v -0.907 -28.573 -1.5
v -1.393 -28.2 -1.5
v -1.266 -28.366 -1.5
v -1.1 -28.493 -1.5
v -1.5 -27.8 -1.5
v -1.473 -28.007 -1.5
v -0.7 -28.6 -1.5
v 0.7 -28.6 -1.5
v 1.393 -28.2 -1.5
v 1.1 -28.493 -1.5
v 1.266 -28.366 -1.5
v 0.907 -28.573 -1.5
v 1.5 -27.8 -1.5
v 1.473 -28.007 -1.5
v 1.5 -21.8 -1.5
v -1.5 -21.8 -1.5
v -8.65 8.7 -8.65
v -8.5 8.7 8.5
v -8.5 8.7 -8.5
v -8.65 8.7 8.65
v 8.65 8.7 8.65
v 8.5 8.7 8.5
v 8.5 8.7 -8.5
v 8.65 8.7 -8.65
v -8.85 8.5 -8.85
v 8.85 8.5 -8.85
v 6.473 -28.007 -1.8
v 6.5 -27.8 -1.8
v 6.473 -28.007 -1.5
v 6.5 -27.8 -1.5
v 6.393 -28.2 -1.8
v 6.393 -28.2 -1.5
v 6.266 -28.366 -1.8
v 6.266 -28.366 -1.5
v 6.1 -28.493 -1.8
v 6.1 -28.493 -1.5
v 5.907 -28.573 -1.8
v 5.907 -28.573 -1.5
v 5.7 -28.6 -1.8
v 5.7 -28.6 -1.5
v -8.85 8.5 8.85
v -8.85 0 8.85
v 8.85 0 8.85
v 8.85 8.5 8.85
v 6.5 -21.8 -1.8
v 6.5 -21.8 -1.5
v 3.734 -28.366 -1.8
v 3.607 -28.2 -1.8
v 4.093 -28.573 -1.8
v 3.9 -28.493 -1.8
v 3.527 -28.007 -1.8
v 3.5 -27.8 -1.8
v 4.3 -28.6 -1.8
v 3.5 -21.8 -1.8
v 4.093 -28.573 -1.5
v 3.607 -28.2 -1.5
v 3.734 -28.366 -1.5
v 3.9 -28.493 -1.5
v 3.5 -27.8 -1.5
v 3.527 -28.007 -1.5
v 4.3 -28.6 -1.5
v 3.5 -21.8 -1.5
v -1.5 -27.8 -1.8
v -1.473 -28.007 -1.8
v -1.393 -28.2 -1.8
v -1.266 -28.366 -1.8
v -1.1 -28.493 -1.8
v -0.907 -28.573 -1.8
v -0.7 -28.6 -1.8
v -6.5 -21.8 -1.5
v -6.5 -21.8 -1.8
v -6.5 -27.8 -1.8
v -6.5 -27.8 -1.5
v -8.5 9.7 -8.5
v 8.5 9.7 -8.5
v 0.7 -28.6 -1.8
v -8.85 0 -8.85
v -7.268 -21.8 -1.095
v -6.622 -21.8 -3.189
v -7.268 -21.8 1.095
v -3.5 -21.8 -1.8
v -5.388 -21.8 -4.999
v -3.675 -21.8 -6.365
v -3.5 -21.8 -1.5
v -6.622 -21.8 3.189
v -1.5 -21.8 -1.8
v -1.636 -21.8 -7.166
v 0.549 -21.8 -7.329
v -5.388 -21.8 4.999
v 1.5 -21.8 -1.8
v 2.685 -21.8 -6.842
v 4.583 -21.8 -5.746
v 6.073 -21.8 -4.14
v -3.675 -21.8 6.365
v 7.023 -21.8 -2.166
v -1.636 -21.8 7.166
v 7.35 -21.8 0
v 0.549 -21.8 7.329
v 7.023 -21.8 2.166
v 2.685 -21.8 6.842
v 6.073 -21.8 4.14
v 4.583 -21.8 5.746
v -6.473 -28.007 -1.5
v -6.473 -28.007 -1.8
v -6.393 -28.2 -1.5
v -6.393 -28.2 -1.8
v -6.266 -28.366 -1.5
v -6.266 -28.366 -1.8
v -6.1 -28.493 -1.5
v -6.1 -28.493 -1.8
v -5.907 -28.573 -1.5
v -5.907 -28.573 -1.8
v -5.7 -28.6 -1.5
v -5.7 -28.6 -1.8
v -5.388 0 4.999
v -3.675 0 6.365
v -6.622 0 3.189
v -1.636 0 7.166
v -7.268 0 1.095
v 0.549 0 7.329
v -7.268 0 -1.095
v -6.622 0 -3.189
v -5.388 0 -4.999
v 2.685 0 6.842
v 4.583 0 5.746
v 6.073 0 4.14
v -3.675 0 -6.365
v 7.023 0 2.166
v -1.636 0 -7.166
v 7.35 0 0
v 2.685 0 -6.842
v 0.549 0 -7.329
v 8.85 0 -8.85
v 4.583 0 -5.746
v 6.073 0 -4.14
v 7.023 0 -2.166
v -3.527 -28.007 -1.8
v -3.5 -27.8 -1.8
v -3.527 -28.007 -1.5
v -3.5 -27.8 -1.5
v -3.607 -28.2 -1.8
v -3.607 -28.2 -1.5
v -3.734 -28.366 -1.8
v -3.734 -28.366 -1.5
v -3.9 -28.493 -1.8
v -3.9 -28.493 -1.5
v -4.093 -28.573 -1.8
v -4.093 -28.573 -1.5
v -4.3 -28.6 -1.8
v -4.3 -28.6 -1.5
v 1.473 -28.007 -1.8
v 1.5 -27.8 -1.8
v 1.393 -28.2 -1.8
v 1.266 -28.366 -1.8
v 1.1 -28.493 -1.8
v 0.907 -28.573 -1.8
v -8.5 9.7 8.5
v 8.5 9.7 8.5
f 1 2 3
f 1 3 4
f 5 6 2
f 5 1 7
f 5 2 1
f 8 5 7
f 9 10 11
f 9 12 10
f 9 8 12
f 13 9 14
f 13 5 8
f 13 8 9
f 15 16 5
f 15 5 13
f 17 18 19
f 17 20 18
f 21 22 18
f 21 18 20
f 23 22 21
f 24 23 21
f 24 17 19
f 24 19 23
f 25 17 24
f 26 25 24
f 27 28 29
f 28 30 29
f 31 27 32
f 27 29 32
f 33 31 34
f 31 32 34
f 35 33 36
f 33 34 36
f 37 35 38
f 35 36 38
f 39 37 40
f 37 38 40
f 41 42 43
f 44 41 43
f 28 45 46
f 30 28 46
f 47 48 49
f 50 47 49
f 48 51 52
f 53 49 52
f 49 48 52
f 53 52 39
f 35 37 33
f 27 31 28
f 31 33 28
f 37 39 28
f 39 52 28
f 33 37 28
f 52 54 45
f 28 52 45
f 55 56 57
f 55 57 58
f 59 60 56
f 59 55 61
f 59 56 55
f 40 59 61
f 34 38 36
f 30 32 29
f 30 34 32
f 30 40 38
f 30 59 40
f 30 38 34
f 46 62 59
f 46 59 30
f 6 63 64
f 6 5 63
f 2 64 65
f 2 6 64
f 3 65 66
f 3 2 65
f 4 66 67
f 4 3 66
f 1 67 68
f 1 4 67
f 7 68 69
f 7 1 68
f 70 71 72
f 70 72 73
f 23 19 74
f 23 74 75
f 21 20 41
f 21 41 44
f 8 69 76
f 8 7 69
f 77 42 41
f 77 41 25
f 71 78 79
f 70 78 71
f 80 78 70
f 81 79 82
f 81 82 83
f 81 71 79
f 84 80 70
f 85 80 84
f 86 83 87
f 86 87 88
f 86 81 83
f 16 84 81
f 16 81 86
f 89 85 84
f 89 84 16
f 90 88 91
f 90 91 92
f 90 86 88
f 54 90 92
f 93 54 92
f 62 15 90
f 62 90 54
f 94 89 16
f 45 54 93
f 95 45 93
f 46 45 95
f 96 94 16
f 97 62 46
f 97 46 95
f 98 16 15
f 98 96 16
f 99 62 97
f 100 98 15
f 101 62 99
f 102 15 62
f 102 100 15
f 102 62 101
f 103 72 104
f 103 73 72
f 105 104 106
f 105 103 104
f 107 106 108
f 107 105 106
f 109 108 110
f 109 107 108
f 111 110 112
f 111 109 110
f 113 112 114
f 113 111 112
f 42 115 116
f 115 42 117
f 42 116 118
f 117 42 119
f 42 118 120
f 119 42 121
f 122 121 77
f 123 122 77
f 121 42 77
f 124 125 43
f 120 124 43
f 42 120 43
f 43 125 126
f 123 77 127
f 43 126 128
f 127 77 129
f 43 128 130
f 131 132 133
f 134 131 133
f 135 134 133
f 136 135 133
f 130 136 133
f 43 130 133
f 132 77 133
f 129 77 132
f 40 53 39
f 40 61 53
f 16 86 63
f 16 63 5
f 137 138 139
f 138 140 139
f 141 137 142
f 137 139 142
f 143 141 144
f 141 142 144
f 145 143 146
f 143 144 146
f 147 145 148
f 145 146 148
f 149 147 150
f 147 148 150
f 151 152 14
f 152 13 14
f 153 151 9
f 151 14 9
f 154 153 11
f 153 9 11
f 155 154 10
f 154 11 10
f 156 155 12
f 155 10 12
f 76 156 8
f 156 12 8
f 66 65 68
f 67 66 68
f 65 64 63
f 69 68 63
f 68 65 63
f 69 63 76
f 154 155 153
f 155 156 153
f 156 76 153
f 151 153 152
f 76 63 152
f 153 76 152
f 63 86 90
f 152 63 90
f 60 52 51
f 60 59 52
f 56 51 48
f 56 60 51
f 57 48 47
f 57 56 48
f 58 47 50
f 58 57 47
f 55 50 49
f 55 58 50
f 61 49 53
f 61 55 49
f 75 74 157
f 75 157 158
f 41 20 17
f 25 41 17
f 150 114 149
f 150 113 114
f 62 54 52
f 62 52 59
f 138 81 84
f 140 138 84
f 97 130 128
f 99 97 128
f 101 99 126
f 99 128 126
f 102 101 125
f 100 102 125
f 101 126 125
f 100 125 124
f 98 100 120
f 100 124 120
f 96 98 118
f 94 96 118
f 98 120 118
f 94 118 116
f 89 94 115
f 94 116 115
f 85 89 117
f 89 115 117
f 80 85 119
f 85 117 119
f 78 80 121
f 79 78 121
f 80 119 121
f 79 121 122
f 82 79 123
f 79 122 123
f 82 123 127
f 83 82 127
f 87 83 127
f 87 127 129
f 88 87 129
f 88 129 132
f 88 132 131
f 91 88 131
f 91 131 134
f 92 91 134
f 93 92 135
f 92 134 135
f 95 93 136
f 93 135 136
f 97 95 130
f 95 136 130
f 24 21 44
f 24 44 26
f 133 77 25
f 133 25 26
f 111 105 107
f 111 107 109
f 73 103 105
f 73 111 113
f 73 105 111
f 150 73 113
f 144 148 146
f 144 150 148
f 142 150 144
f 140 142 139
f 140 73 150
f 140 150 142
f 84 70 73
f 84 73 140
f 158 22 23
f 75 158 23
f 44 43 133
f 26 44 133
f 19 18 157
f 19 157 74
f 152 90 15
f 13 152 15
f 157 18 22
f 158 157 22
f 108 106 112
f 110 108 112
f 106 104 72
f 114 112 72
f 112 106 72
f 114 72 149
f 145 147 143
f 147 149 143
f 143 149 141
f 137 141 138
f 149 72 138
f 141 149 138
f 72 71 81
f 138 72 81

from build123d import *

# Parameters (mm, degrees)
SKETCH_1_W      = 17.7
SKETCH_1_H      = 17.7
EXTRUDE_1_DEPTH = 8.7
SKETCH_2_R      = 7.35
EXTRUDE_2_DEPTH = 21.8
SKETCH_3_W      = 3
SKETCH_3_H      = 0.3
EXTRUDE_3_DEPTH = 6.8
FILLET_1_R      = 0.8
SKETCH_4_W      = 17
SKETCH_4_H      = 17
EXTRUDE_4_DEPTH = 1
CHAMFER_1_SIZE  = 0.2


with BuildPart() as part:
    # 草图1 → 凸台-拉伸1 (new body)
    with BuildSketch(Plane(origin=(0, 0, 0), x_dir=(1, 0, 0), z_dir=(0, 1, 0))):
        Rectangle(SKETCH_1_W, SKETCH_1_H)
    extrude(amount=EXTRUDE_1_DEPTH)

    # 草图2 → 凸台-拉伸2 (add)
    with BuildSketch(Plane.XZ):
        Circle(SKETCH_2_R)
    extrude(amount=EXTRUDE_2_DEPTH)

    # 草图3 → 凸台-拉伸3 (add)
    with BuildSketch(Plane.XZ.offset(21.8)):
        with Locations((-5, -1.65)):
            Rectangle(SKETCH_3_W, SKETCH_3_H)
        with Locations((0, -1.65)):
            Rectangle(SKETCH_3_W, SKETCH_3_H)
        with Locations((5, -1.65)):
            Rectangle(SKETCH_3_W, SKETCH_3_H)
    extrude(amount=EXTRUDE_3_DEPTH)

    # 圆角1
    fillet_1_edges = [part.edges().sort_by_distance(p)[0] for p in [
        (-6.5, -28.6, -1.65),
        (-3.5, -28.6, -1.65),
        (-1.5, -28.6, -1.65),
        (1.5, -28.6, -1.65),
        (3.5, -28.6, -1.65),
        (6.5, -28.6, -1.65),
    ]]
    fillet(fillet_1_edges, radius=FILLET_1_R)

    # 草图4 → 凸台-拉伸4 (add)
    with BuildSketch(Plane(origin=(0, 8.7, 0), x_dir=(1, 0, 0), z_dir=(0, 1, 0))):
        Rectangle(SKETCH_4_W, SKETCH_4_H)
    extrude(amount=EXTRUDE_4_DEPTH)

    # 倒角1
    chamfer_1_edges = [part.edges().sort_by_distance(p)[0] for p in [
        (-8.85, 8.7, 0),
        (0, 8.7, 8.85),
        (8.85, 8.7, 0),
        (0, 8.7, -8.85),
    ]]
    chamfer(chamfer_1_edges, length=CHAMFER_1_SIZE)


solid = part.part
